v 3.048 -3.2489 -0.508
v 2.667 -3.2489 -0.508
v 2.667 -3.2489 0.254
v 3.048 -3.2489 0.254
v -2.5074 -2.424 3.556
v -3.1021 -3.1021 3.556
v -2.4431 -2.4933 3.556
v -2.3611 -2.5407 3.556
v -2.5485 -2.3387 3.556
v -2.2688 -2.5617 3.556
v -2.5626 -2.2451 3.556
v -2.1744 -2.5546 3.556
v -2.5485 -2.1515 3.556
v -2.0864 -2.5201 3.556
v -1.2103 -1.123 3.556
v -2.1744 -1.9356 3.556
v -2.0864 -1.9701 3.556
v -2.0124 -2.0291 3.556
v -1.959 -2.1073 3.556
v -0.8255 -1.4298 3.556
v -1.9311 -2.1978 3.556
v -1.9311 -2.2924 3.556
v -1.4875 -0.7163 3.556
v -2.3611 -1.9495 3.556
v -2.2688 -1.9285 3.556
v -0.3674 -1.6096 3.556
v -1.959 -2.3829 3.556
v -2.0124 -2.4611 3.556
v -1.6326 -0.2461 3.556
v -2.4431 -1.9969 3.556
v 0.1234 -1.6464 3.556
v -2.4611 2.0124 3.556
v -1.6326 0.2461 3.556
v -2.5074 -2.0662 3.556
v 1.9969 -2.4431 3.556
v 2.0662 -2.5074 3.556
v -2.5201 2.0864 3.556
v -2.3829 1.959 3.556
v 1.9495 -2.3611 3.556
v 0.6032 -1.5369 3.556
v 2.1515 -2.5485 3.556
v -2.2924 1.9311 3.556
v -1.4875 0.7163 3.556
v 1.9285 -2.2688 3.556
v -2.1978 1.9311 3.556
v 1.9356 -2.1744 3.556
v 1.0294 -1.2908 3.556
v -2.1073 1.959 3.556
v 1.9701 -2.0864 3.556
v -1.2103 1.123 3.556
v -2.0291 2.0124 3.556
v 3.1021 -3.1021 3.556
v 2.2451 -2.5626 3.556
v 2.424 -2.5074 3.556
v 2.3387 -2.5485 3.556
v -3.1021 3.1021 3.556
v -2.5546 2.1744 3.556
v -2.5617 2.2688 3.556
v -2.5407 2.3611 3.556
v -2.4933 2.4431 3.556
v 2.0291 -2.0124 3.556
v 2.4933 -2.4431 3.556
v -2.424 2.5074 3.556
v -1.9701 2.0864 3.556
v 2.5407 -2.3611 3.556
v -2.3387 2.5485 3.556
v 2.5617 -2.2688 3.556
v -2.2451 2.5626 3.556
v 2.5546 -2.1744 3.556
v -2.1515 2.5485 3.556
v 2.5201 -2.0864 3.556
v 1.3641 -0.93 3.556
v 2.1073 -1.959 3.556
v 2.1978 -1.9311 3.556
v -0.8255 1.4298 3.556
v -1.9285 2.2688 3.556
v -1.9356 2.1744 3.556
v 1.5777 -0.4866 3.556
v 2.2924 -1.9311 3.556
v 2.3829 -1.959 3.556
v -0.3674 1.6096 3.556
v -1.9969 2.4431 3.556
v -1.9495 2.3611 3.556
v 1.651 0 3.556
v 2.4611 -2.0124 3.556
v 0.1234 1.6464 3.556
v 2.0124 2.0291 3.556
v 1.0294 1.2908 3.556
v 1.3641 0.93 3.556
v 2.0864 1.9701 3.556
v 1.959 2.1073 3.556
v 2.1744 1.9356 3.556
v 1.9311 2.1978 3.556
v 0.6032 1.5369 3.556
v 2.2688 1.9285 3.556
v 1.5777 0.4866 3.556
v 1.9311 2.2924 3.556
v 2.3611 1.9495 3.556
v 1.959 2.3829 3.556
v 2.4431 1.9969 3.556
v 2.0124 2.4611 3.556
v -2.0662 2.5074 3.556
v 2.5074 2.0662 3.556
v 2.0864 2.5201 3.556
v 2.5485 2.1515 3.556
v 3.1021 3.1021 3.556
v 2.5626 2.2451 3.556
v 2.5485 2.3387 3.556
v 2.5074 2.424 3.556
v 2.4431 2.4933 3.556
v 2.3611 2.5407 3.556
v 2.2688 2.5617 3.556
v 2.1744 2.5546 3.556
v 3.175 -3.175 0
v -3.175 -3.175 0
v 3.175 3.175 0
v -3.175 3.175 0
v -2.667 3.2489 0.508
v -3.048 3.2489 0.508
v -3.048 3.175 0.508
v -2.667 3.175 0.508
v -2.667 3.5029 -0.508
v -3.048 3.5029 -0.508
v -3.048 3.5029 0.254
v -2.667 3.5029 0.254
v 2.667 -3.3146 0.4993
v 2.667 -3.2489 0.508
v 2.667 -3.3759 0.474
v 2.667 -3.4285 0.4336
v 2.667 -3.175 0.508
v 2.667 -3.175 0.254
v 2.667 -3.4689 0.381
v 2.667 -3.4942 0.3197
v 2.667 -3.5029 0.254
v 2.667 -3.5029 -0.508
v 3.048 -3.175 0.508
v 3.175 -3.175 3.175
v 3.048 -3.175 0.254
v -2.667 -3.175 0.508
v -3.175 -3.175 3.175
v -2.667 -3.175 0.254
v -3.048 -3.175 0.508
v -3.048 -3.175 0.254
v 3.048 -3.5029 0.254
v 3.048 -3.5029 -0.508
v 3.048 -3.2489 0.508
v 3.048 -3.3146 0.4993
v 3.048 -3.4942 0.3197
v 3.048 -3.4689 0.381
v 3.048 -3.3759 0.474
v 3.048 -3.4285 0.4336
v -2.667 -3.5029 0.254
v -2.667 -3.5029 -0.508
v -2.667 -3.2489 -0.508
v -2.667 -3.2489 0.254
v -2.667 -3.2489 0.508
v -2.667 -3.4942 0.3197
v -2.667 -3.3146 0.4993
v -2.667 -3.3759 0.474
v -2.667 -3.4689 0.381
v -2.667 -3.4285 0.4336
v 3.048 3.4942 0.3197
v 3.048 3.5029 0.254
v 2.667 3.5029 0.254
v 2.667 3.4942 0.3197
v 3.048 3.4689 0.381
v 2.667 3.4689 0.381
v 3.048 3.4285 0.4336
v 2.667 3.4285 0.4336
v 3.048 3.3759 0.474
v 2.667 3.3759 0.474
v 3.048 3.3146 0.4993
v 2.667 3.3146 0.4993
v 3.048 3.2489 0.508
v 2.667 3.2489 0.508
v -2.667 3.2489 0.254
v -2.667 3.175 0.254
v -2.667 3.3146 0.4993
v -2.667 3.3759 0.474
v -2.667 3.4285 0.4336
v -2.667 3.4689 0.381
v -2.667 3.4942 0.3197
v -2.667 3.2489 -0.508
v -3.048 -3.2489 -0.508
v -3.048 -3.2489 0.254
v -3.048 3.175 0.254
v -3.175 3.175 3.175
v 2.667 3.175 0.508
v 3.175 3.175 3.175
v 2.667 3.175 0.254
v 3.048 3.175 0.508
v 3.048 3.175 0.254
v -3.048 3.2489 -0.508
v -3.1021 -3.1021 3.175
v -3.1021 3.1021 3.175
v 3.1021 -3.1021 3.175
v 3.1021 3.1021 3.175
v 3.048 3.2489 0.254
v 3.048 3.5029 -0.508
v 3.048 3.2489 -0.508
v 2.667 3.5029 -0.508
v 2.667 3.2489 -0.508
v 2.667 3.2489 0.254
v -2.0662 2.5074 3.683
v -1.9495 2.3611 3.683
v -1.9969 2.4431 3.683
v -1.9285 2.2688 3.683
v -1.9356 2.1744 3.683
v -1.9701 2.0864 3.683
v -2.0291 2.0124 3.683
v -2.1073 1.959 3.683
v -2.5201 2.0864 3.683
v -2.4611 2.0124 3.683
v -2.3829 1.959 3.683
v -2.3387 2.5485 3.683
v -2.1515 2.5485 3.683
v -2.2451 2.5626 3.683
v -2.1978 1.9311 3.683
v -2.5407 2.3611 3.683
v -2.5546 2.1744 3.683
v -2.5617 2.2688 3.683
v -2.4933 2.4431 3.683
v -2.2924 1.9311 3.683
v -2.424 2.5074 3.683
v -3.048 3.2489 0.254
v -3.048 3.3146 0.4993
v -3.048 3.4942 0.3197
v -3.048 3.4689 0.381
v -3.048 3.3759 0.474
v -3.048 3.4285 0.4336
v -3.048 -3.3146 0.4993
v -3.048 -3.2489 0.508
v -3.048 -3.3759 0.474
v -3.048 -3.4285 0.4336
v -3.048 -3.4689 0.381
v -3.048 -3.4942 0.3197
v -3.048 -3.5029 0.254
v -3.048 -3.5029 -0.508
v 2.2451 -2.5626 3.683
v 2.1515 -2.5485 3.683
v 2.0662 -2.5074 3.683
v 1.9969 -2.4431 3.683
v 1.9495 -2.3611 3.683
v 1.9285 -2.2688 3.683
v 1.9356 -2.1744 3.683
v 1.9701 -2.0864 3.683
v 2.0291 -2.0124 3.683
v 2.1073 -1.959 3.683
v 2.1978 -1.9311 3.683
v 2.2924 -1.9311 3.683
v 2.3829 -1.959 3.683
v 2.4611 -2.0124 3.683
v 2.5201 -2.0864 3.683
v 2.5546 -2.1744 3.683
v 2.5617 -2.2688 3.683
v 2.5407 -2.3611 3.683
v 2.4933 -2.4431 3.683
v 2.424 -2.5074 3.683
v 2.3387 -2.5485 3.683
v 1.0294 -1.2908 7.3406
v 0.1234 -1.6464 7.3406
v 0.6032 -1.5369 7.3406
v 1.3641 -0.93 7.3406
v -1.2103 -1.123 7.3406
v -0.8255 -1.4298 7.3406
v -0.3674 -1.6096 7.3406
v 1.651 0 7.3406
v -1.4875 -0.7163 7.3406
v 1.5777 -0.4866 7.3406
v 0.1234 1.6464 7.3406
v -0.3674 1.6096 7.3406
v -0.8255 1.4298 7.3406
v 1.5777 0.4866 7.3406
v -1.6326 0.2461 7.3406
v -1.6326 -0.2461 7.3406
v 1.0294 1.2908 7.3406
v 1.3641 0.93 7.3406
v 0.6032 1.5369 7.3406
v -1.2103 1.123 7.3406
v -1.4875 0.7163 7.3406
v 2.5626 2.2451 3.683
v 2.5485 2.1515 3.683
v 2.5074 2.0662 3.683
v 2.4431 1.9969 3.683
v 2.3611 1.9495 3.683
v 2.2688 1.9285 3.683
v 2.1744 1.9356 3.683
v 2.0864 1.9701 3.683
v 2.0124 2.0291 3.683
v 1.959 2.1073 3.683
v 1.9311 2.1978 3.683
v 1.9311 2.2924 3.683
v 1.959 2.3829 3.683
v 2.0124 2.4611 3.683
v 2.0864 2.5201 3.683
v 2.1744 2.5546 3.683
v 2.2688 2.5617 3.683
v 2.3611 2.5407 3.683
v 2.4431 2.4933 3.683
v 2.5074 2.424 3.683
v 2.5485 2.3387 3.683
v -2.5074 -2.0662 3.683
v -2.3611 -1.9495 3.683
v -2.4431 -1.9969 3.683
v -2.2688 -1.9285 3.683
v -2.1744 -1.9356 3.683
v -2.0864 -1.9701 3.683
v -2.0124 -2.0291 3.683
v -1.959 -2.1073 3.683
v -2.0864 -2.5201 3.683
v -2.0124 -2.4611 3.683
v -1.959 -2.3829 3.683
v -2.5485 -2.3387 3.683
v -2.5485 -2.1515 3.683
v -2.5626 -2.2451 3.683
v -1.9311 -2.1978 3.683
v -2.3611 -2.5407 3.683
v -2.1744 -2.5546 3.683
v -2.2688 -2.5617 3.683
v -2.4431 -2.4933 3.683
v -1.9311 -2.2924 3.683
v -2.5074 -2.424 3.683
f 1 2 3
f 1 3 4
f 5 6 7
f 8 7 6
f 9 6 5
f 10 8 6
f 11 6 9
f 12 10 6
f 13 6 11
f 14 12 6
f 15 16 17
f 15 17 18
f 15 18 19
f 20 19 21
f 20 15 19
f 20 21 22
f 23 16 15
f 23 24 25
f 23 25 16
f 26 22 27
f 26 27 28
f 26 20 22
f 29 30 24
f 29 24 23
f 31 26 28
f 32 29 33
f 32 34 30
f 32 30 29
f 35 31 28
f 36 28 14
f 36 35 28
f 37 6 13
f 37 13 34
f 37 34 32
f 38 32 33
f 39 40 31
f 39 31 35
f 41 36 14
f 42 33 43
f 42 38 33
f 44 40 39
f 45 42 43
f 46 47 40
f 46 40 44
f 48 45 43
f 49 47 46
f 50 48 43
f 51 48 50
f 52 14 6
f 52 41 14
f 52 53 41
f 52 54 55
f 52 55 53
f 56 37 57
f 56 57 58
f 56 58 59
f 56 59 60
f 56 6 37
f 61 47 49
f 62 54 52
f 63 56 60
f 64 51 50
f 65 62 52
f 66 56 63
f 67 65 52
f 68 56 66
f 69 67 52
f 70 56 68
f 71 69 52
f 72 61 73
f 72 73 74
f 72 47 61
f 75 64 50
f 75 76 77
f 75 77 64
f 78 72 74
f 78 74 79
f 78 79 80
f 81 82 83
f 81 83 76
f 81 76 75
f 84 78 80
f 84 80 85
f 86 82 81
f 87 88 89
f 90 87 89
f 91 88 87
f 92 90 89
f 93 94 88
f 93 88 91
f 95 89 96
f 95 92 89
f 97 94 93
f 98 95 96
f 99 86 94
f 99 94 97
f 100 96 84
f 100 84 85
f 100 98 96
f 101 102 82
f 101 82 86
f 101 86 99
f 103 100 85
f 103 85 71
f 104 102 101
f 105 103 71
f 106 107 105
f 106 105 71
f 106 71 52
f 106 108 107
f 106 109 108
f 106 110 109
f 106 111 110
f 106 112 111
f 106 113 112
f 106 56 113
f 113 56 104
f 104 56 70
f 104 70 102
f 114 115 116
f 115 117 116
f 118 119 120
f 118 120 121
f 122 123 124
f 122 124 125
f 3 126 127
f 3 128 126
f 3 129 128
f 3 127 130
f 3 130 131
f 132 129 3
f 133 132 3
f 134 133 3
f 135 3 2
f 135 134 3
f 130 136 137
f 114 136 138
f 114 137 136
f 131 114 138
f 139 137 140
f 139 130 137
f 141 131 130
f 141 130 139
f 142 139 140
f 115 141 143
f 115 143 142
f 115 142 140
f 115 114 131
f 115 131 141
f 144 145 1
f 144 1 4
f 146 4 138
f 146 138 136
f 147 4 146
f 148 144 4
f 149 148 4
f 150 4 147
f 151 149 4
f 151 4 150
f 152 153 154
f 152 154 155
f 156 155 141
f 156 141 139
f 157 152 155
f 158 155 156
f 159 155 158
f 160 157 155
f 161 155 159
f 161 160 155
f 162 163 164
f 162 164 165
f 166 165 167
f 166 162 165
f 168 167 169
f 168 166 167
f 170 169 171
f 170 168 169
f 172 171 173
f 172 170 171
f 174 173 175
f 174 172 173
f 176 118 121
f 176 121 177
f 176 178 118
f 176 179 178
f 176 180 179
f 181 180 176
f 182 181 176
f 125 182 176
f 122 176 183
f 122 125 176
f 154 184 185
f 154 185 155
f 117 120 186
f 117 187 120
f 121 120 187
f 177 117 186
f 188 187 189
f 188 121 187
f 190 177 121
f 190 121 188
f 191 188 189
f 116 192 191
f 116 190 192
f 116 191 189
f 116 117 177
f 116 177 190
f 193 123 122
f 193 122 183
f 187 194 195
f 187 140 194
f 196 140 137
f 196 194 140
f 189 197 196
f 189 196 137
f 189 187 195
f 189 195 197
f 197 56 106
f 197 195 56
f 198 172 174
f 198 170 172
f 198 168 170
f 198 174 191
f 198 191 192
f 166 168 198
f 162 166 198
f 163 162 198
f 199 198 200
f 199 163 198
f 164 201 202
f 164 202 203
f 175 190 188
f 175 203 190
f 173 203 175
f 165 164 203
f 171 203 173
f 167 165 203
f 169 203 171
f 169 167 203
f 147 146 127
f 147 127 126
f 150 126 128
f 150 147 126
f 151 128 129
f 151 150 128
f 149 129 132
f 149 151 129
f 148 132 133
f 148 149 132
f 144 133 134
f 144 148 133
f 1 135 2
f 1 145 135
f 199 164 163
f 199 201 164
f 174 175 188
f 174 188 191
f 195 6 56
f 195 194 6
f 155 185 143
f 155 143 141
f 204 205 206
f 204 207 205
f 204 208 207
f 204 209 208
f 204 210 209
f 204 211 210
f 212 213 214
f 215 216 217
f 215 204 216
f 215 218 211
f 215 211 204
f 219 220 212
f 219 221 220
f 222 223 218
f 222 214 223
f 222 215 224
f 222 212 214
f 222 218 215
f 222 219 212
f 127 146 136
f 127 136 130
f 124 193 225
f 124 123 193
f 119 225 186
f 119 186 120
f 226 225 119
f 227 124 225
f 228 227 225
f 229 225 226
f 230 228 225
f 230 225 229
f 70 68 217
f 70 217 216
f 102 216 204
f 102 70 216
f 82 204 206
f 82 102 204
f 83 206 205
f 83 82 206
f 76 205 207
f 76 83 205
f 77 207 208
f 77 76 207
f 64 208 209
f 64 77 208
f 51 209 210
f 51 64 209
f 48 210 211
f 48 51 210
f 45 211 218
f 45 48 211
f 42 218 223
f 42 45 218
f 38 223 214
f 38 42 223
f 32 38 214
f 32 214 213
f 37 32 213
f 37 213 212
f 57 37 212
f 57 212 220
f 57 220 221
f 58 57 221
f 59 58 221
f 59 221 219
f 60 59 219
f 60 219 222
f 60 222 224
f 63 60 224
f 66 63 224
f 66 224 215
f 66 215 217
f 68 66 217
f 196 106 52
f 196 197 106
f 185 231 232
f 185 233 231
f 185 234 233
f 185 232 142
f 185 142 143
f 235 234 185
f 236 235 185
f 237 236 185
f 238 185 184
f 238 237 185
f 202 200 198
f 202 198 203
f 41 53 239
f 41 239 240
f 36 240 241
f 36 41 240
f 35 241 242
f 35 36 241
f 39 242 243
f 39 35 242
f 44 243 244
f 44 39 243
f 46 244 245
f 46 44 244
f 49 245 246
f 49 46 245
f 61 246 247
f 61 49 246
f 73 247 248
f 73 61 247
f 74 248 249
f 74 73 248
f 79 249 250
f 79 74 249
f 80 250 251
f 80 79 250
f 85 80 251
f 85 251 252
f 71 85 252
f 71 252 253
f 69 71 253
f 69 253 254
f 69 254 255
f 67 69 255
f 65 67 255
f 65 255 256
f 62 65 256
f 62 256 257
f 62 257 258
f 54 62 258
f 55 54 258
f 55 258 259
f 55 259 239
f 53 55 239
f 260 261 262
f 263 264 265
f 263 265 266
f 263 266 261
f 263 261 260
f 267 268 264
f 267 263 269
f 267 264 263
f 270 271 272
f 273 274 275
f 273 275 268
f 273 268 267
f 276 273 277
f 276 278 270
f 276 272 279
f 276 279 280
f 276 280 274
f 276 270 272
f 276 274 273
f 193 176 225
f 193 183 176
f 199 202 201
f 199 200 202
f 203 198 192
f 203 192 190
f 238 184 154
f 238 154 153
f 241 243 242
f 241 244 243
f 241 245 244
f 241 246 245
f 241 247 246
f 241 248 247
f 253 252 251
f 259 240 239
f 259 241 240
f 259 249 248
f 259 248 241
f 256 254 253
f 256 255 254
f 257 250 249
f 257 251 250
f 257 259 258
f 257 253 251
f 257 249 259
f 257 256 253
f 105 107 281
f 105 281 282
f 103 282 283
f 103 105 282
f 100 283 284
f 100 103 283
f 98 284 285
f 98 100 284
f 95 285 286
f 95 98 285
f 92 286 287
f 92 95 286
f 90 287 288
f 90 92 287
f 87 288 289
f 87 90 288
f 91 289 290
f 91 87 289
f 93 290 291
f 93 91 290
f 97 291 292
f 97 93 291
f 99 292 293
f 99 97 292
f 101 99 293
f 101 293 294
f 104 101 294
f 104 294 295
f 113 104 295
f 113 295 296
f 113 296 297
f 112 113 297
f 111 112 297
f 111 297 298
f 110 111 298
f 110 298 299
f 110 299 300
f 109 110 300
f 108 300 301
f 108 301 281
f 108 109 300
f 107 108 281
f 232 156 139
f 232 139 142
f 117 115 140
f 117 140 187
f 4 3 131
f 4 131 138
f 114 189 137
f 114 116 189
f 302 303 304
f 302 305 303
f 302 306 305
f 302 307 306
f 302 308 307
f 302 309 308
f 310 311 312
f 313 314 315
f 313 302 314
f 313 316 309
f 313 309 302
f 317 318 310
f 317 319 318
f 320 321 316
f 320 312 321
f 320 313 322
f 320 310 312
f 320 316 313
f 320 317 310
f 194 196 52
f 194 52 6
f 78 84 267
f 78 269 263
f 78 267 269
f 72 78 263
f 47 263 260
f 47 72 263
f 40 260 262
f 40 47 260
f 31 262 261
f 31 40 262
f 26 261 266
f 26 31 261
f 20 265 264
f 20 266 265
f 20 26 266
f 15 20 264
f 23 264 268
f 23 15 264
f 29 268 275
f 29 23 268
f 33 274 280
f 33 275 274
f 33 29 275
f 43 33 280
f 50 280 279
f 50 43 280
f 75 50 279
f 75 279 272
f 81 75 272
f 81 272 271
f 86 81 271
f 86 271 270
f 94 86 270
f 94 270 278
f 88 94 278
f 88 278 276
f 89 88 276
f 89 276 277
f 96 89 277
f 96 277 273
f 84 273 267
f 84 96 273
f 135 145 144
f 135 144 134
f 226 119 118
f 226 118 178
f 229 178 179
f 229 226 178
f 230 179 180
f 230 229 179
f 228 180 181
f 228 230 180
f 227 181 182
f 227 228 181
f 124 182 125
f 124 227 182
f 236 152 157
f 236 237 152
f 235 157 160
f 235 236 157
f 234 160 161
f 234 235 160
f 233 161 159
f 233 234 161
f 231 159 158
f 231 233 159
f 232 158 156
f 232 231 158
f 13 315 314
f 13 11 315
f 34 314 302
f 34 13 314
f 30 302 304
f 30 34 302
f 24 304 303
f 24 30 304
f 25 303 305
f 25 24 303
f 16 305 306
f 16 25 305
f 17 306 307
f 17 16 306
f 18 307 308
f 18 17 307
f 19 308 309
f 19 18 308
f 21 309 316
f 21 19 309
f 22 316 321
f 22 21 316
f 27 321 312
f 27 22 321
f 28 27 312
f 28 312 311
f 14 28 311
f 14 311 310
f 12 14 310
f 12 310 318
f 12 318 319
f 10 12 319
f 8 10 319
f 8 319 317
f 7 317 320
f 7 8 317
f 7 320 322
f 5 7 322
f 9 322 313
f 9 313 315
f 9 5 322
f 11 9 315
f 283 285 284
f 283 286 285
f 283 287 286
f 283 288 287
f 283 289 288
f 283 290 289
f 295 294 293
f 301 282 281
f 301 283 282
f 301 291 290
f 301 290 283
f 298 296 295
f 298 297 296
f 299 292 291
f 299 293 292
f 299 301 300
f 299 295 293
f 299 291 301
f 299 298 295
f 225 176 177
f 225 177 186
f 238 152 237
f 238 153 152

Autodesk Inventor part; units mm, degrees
ref_plane "YZ Plane" through (0, 0, 0) normal (1, 0, 0) x (0, 1, 0)
ref_plane "XZ Plane" through (0, 0, 0) normal (0, 1, 0) x (-1, 0, 0)
sketch "Sketch1" plane through (0, 0, 0) normal (0, 0, 1) x (1, 0, 0)
  line L0 (-3.175, 3.175) -> (3.175, 3.175)
  line L1 (3.175, 3.175) -> (3.175, -3.175)
  line L2 (3.175, -3.175) -> (-3.175, -3.175)
  line L3 (-3.175, -3.175) -> (-3.175, 3.175)
  line L4 (0, 0) -> (0, 0.9618)
  line L5 (0, 0) -> (0.9618, 0)
  dimension "d0" = 6.35
extrude "Extrusion1" add sketch "Sketch1" along normal blind 3.175
sketch "Sketch2" plane through (0, 0, 3.175) normal (0, 0, 1) x (1, 0, 0)
  circle A0 centre (0, 0) radius 1.651
  dimension "d3" = 3.302
extrude "Extrusion2" add sketch "Sketch2" along normal blind 4.1656
sketch "Sketch3" plane through (0, 0, 3.175) normal (0, 0, 1) x (1, 0, 0)
  circle A0 centre (0, 0) radius 1.651 projected
  circle A1 centre (0, 0) radius 3.175
  line L0 (0, 0) -> (3.175, 3.175)
  circle A2 centre (2.2451, 2.2451) radius 0.3175
  dimension "d6" = 0.635
extrude "Extrusion3" add sketch "Sketch3" along normal blind 0.508 contours A2 A1 L0 | L0 A1 A2 | L0 A2 A1 | A1 A2 L0
pattern_circular "Circular Pattern1" count 4 over 360 about axis through (0, 0, 3.175) along (0, 0, 1) of "Extrusion3"
sketch "Sketch4" plane through (0, 0, 3.175) normal (0, 0, 1) x (1, 0, 0)
  circle A0 centre (2.2451, -2.2451) radius 0.3175 projected
  circle A1 centre (-2.2451, -2.2451) radius 0.3175 projected
  circle A2 centre (-2.2451, 2.2451) radius 0.3175 projected
  circle A3 centre (2.2451, 2.2451) radius 0.3175 projected
  circle A4 centre (0, 0) radius 1.651 projected
  line L0 (3.175, 3.175) -> (3.175, -3.175) projected
  line L1 (-3.175, 3.175) -> (3.175, 3.175) projected
  line L2 (-3.175, -3.175) -> (-3.175, 3.175) projected
  line L3 (3.175, -3.175) -> (-3.175, -3.175) projected
  line L4 (3.1021, 3.1021) -> (3.1021, -3.1021)
  line L5 (3.1021, -3.1021) -> (-3.1021, -3.1021)
  line L6 (-3.1021, -3.1021) -> (-3.1021, 3.1021)
  line L7 (-3.1021, 3.1021) -> (3.1021, 3.1021)
extrude "Extrusion4" add sketch "Sketch4" along normal blind 0.381 contours L4 L5 L6 L7
sketch "Sketch5" plane through (-3.175, -3.175, 0) normal (0, -1, 0) x (1, 0, 0)
  line L0 (0, 0) -> (0, 3.175) projected
  line L1 (6.35, 0) -> (0, 0) projected
  line L2 (0.127, 0.508) -> (0.508, 0.508)
  line L3 (0.508, 0.508) -> (0.508, 0.254)
  line L4 (0.508, 0.254) -> (0.127, 0.254)
  line L5 (0.127, 0.254) -> (0.127, 0.508)
  dimension "d14" = 0.381
  dimension "d15" = 0.254
  dimension "d16" = 0.127
  dimension "d17" = 0.254
ref_plane "Work Plane1" through (-2.667, -3.175, 0.508) normal (-1, 0, 0) x (0, 0, -1)
sketch "Sketch6" plane through (-2.667, -3.175, 0.508) normal (-1, 0, 0) x (0, 0, -1)
  line L0 (0, -0.1801) -> (0, 0.0739)
  line L1 (0.254, 0.3279) -> (1.016, 0.3279)
  arc A0 (0.254, 0.3279) -> (0, 0.0739) centre (0.254, 0.0739) ccw
  point P0 (0, 0.3279)
  dimension "d19" = 0.508
  dimension "d20" = 1.016
  dimension "d21" = 0.254
sweep "Sweep1" add profiles "Sketch5" path "Sketch6"
mirror "Mirror1" about plane through (0, 0, 0) normal (1, 0, 0) of "Sweep1"
mirror "Mirror2" about plane through (0, 0, 0) normal (0, 1, 0) of "Sweep1", "Mirror1"
properties part number "cRIO-FRC Switch" material "ABS Plastic"
